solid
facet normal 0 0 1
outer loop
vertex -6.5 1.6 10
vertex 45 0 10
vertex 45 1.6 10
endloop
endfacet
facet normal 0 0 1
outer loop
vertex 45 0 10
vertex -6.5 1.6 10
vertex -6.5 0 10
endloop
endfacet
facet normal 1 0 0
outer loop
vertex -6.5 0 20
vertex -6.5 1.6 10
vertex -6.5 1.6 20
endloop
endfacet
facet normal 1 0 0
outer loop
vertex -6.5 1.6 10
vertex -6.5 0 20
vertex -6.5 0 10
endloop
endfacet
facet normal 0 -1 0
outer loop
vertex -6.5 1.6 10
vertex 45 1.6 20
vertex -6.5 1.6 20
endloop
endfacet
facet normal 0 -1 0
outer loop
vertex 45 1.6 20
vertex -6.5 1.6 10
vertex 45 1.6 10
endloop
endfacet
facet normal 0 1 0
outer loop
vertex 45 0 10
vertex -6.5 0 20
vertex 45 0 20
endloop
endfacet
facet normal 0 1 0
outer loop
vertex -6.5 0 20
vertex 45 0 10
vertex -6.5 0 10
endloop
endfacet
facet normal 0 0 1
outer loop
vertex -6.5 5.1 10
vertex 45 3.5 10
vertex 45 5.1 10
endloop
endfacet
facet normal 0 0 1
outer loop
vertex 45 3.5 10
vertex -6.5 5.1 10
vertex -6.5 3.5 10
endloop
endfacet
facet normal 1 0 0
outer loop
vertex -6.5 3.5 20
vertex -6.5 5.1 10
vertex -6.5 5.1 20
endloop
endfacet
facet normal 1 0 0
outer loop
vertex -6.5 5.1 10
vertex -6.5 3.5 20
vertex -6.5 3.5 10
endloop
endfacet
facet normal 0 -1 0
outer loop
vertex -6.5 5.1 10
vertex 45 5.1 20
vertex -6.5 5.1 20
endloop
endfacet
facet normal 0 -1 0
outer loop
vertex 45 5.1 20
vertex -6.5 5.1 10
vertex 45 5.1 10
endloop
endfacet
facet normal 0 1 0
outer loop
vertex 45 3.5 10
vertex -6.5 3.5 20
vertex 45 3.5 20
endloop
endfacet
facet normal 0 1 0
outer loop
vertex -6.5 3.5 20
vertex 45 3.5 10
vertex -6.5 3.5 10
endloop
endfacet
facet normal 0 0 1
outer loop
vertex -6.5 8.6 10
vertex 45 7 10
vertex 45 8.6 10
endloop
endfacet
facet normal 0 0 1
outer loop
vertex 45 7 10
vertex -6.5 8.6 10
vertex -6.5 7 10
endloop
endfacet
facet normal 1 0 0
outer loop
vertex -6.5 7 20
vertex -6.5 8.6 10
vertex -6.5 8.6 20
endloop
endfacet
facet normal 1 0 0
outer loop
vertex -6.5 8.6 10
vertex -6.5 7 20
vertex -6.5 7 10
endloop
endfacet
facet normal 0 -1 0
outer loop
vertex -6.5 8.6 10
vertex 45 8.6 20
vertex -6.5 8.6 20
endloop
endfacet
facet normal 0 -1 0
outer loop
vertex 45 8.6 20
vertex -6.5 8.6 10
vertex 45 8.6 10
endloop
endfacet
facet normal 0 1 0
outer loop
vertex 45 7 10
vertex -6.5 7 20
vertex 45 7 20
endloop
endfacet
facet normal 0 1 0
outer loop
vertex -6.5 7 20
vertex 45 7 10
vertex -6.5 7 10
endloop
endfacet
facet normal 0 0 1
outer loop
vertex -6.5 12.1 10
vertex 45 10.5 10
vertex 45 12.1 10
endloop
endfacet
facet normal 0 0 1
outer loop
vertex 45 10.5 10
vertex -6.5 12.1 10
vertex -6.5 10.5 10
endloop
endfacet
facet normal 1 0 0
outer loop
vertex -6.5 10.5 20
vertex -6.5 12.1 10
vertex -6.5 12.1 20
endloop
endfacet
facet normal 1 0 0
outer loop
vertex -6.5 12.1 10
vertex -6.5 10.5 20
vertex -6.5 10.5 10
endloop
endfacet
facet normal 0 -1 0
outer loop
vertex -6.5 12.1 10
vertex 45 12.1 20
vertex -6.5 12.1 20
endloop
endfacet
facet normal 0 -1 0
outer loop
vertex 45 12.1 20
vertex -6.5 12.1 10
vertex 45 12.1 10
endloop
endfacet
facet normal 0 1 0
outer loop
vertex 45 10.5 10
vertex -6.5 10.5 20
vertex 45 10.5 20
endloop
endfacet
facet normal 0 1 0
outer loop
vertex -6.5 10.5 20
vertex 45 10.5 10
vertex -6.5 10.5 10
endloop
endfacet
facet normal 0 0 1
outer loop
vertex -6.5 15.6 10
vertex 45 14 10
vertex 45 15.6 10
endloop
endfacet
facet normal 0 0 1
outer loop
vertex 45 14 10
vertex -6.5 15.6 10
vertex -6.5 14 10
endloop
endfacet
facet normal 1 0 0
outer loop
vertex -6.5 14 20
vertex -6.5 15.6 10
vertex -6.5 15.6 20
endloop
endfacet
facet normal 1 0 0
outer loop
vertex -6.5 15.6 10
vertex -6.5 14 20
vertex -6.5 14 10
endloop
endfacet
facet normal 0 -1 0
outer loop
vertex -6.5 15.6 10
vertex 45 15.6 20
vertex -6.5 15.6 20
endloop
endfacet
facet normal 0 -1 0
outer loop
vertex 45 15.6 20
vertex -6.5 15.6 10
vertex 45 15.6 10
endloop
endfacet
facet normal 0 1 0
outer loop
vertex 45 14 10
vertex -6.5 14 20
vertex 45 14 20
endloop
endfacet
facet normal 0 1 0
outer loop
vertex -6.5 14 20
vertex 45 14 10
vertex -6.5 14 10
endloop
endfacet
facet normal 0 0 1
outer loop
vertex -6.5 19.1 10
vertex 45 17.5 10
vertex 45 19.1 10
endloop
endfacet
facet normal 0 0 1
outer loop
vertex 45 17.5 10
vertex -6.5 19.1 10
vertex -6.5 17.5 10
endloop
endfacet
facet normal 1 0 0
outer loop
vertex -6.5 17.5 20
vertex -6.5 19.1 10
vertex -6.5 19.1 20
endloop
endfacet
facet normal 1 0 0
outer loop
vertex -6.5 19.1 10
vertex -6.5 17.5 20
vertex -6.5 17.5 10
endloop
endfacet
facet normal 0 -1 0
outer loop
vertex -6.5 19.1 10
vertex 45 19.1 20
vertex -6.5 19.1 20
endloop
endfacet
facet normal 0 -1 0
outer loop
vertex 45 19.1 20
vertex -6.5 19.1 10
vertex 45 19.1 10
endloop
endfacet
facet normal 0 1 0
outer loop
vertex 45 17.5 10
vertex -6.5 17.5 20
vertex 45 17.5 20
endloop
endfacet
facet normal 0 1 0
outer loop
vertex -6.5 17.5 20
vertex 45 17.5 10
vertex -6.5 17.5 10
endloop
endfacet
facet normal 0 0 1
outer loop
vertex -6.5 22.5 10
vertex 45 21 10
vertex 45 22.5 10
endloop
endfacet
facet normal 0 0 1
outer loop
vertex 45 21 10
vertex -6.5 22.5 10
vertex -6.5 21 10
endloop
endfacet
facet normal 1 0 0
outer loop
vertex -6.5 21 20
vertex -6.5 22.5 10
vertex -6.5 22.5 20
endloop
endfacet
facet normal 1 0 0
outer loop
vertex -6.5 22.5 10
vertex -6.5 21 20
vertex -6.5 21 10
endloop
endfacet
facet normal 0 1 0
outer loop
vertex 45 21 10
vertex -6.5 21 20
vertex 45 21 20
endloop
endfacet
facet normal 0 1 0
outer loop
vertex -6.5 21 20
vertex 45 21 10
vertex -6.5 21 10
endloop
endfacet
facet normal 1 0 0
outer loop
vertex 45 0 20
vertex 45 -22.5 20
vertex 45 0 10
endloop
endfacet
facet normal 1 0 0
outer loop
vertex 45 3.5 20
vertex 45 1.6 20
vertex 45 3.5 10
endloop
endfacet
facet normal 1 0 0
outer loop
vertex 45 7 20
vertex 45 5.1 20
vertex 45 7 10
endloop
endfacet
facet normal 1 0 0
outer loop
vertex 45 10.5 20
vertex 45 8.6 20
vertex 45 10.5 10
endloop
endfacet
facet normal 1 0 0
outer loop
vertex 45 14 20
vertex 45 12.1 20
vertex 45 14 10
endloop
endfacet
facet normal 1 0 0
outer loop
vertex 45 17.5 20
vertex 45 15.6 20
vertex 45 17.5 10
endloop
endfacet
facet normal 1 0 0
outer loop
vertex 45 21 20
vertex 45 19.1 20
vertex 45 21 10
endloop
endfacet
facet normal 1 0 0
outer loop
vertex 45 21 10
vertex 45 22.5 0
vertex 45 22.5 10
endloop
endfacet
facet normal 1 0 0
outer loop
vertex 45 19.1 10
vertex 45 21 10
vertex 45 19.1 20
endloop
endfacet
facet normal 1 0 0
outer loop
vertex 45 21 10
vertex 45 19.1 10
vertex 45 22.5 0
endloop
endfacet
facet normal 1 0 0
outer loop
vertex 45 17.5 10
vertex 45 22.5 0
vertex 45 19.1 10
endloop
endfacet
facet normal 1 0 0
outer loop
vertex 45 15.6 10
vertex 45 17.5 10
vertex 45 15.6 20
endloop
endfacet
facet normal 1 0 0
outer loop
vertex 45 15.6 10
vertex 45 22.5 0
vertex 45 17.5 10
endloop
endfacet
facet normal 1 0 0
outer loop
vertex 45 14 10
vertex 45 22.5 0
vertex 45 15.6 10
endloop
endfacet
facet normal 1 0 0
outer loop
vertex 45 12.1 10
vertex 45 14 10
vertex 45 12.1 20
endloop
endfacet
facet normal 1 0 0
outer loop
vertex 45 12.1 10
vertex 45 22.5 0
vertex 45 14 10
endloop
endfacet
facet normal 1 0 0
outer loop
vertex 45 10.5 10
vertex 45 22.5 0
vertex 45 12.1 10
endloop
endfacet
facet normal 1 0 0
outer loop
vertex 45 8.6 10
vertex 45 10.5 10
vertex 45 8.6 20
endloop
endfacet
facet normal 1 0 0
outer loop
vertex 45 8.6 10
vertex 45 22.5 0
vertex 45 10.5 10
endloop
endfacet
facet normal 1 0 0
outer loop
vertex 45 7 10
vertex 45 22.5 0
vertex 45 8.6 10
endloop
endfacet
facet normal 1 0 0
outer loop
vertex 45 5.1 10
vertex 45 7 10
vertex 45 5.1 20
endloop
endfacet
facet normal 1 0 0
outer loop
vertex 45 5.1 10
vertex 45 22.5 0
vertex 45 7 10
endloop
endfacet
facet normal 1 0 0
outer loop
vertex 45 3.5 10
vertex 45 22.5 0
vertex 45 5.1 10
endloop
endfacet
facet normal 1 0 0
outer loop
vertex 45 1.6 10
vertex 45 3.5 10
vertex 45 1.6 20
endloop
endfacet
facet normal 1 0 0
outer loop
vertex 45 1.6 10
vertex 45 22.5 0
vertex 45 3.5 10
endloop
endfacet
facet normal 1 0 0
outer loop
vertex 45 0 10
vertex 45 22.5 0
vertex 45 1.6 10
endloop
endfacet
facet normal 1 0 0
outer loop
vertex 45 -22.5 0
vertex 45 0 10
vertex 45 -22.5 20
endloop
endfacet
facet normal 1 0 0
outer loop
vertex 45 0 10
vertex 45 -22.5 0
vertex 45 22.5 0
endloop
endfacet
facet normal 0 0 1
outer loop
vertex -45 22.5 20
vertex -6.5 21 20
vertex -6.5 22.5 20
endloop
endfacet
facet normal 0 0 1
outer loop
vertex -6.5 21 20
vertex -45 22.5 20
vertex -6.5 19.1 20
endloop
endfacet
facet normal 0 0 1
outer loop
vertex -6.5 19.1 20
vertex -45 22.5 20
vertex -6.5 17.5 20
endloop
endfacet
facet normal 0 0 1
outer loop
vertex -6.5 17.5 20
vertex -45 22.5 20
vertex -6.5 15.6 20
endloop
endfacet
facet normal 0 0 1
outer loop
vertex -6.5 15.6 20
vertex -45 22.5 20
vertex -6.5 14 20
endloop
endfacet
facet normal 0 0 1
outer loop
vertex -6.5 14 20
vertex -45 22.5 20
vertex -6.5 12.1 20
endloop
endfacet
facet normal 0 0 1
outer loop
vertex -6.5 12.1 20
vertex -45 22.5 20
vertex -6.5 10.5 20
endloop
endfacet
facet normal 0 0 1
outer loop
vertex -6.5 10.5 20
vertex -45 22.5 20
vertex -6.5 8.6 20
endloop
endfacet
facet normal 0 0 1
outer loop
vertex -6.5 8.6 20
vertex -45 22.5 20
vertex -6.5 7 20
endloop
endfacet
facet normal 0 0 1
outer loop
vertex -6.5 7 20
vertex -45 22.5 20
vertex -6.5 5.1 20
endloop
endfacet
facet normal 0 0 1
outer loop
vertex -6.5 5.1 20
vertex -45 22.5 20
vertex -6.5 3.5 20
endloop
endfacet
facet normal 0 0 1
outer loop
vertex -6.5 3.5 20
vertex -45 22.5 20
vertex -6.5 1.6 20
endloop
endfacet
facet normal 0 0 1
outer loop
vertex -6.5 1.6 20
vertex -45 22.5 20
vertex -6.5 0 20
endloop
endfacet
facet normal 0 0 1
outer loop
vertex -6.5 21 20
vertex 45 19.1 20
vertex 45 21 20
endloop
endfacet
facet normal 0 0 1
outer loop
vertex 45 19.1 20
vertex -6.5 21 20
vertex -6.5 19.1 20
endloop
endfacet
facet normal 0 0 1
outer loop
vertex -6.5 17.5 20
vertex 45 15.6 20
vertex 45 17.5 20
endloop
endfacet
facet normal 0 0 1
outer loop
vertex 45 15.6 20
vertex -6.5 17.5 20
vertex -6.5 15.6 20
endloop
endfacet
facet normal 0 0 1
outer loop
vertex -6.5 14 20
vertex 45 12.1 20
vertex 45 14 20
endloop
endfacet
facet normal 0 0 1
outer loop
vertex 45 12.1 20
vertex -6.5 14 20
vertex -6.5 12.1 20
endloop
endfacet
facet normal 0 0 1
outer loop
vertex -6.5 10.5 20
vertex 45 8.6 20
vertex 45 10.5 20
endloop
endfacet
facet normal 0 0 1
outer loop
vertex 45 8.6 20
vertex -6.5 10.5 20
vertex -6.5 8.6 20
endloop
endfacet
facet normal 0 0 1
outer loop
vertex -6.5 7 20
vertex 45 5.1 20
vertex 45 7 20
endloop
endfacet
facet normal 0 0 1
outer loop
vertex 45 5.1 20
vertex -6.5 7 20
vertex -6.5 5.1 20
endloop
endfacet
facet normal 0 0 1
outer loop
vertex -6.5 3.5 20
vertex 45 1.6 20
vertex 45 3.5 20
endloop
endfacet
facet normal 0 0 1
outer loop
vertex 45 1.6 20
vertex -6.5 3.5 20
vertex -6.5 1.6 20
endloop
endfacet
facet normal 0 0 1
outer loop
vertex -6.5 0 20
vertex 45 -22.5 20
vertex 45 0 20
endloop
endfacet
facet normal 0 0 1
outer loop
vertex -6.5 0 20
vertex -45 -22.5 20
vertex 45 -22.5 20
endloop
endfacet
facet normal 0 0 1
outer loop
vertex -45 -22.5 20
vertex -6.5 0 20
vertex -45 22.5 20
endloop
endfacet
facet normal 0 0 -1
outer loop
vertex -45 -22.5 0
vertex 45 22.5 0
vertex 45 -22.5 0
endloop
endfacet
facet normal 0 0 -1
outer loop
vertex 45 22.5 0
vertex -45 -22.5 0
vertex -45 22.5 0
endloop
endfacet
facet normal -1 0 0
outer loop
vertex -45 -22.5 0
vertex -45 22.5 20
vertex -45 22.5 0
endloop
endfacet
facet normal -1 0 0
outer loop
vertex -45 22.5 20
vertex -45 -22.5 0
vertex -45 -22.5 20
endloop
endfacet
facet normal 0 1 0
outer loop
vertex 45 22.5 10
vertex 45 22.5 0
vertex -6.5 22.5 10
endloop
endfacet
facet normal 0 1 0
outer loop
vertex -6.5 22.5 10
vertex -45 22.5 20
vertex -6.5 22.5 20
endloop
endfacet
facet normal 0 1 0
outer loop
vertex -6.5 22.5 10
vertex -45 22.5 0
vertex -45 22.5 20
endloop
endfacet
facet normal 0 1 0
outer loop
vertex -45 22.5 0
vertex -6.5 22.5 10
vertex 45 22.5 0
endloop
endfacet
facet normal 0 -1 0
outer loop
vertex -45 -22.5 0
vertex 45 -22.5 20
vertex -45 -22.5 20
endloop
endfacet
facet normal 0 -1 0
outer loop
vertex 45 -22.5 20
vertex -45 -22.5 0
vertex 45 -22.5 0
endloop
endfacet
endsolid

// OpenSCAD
// Slide drying rack - holds 10 microscope slides standing on their long edge
// Print orientation: base block on the bed (z = 0), slots open upward.

// ---------------- Parameters ----------------
n_slots      = 10;    // number of slide slots
slide_len    = 75;    // slide length along X (mm)
slide_wid    = 25;    // slide width along Y (mm)
slide_thk    = 1;     // slide thickness along Z (mm)

base_len     = 90;    // block length along X (mm)
base_wid     = 45;    // block width along Y (mm)
base_h       = 20;    // block height along Z (mm)

slot_len     = 77;    // slot length along X (mm)   (overlaps the block in X)
slot_w       = 1.6;   // slot width along Y (mm)
slot_depth   = 10;    // slot depth from the top face (mm)

slot_pitch   = 3.5;   // centre-to-centre slot spacing along Y (mm)

eps          = 0.5;   // cutter overshoot past the top face (mm)
$fn          = 64;    // circle resolution (no curves here, set per the rules)

// ---------------- Derived ----------------
slot_x0 = -(base_len - slot_len) / 2;   // first slot start X (keeps the group centred)
// The first slot is centred on y = 0, then each slot is slot_pitch higher in Y.

// ---------------- Model ----------------
difference() {
    // Solid base block, centred in X and Y, sitting on z = 0
    translate([-base_len / 2, -base_wid / 2, 0])
        cube([base_len, base_wid, base_h]);

    // Parallel slots running along X, open at the top
    for (i = [0 : n_slots - 1]) {
        translate([slot_x0, i * slot_pitch, base_h - slot_depth])
            cube([slot_len, slot_w, slot_depth + eps]);
    }
}
